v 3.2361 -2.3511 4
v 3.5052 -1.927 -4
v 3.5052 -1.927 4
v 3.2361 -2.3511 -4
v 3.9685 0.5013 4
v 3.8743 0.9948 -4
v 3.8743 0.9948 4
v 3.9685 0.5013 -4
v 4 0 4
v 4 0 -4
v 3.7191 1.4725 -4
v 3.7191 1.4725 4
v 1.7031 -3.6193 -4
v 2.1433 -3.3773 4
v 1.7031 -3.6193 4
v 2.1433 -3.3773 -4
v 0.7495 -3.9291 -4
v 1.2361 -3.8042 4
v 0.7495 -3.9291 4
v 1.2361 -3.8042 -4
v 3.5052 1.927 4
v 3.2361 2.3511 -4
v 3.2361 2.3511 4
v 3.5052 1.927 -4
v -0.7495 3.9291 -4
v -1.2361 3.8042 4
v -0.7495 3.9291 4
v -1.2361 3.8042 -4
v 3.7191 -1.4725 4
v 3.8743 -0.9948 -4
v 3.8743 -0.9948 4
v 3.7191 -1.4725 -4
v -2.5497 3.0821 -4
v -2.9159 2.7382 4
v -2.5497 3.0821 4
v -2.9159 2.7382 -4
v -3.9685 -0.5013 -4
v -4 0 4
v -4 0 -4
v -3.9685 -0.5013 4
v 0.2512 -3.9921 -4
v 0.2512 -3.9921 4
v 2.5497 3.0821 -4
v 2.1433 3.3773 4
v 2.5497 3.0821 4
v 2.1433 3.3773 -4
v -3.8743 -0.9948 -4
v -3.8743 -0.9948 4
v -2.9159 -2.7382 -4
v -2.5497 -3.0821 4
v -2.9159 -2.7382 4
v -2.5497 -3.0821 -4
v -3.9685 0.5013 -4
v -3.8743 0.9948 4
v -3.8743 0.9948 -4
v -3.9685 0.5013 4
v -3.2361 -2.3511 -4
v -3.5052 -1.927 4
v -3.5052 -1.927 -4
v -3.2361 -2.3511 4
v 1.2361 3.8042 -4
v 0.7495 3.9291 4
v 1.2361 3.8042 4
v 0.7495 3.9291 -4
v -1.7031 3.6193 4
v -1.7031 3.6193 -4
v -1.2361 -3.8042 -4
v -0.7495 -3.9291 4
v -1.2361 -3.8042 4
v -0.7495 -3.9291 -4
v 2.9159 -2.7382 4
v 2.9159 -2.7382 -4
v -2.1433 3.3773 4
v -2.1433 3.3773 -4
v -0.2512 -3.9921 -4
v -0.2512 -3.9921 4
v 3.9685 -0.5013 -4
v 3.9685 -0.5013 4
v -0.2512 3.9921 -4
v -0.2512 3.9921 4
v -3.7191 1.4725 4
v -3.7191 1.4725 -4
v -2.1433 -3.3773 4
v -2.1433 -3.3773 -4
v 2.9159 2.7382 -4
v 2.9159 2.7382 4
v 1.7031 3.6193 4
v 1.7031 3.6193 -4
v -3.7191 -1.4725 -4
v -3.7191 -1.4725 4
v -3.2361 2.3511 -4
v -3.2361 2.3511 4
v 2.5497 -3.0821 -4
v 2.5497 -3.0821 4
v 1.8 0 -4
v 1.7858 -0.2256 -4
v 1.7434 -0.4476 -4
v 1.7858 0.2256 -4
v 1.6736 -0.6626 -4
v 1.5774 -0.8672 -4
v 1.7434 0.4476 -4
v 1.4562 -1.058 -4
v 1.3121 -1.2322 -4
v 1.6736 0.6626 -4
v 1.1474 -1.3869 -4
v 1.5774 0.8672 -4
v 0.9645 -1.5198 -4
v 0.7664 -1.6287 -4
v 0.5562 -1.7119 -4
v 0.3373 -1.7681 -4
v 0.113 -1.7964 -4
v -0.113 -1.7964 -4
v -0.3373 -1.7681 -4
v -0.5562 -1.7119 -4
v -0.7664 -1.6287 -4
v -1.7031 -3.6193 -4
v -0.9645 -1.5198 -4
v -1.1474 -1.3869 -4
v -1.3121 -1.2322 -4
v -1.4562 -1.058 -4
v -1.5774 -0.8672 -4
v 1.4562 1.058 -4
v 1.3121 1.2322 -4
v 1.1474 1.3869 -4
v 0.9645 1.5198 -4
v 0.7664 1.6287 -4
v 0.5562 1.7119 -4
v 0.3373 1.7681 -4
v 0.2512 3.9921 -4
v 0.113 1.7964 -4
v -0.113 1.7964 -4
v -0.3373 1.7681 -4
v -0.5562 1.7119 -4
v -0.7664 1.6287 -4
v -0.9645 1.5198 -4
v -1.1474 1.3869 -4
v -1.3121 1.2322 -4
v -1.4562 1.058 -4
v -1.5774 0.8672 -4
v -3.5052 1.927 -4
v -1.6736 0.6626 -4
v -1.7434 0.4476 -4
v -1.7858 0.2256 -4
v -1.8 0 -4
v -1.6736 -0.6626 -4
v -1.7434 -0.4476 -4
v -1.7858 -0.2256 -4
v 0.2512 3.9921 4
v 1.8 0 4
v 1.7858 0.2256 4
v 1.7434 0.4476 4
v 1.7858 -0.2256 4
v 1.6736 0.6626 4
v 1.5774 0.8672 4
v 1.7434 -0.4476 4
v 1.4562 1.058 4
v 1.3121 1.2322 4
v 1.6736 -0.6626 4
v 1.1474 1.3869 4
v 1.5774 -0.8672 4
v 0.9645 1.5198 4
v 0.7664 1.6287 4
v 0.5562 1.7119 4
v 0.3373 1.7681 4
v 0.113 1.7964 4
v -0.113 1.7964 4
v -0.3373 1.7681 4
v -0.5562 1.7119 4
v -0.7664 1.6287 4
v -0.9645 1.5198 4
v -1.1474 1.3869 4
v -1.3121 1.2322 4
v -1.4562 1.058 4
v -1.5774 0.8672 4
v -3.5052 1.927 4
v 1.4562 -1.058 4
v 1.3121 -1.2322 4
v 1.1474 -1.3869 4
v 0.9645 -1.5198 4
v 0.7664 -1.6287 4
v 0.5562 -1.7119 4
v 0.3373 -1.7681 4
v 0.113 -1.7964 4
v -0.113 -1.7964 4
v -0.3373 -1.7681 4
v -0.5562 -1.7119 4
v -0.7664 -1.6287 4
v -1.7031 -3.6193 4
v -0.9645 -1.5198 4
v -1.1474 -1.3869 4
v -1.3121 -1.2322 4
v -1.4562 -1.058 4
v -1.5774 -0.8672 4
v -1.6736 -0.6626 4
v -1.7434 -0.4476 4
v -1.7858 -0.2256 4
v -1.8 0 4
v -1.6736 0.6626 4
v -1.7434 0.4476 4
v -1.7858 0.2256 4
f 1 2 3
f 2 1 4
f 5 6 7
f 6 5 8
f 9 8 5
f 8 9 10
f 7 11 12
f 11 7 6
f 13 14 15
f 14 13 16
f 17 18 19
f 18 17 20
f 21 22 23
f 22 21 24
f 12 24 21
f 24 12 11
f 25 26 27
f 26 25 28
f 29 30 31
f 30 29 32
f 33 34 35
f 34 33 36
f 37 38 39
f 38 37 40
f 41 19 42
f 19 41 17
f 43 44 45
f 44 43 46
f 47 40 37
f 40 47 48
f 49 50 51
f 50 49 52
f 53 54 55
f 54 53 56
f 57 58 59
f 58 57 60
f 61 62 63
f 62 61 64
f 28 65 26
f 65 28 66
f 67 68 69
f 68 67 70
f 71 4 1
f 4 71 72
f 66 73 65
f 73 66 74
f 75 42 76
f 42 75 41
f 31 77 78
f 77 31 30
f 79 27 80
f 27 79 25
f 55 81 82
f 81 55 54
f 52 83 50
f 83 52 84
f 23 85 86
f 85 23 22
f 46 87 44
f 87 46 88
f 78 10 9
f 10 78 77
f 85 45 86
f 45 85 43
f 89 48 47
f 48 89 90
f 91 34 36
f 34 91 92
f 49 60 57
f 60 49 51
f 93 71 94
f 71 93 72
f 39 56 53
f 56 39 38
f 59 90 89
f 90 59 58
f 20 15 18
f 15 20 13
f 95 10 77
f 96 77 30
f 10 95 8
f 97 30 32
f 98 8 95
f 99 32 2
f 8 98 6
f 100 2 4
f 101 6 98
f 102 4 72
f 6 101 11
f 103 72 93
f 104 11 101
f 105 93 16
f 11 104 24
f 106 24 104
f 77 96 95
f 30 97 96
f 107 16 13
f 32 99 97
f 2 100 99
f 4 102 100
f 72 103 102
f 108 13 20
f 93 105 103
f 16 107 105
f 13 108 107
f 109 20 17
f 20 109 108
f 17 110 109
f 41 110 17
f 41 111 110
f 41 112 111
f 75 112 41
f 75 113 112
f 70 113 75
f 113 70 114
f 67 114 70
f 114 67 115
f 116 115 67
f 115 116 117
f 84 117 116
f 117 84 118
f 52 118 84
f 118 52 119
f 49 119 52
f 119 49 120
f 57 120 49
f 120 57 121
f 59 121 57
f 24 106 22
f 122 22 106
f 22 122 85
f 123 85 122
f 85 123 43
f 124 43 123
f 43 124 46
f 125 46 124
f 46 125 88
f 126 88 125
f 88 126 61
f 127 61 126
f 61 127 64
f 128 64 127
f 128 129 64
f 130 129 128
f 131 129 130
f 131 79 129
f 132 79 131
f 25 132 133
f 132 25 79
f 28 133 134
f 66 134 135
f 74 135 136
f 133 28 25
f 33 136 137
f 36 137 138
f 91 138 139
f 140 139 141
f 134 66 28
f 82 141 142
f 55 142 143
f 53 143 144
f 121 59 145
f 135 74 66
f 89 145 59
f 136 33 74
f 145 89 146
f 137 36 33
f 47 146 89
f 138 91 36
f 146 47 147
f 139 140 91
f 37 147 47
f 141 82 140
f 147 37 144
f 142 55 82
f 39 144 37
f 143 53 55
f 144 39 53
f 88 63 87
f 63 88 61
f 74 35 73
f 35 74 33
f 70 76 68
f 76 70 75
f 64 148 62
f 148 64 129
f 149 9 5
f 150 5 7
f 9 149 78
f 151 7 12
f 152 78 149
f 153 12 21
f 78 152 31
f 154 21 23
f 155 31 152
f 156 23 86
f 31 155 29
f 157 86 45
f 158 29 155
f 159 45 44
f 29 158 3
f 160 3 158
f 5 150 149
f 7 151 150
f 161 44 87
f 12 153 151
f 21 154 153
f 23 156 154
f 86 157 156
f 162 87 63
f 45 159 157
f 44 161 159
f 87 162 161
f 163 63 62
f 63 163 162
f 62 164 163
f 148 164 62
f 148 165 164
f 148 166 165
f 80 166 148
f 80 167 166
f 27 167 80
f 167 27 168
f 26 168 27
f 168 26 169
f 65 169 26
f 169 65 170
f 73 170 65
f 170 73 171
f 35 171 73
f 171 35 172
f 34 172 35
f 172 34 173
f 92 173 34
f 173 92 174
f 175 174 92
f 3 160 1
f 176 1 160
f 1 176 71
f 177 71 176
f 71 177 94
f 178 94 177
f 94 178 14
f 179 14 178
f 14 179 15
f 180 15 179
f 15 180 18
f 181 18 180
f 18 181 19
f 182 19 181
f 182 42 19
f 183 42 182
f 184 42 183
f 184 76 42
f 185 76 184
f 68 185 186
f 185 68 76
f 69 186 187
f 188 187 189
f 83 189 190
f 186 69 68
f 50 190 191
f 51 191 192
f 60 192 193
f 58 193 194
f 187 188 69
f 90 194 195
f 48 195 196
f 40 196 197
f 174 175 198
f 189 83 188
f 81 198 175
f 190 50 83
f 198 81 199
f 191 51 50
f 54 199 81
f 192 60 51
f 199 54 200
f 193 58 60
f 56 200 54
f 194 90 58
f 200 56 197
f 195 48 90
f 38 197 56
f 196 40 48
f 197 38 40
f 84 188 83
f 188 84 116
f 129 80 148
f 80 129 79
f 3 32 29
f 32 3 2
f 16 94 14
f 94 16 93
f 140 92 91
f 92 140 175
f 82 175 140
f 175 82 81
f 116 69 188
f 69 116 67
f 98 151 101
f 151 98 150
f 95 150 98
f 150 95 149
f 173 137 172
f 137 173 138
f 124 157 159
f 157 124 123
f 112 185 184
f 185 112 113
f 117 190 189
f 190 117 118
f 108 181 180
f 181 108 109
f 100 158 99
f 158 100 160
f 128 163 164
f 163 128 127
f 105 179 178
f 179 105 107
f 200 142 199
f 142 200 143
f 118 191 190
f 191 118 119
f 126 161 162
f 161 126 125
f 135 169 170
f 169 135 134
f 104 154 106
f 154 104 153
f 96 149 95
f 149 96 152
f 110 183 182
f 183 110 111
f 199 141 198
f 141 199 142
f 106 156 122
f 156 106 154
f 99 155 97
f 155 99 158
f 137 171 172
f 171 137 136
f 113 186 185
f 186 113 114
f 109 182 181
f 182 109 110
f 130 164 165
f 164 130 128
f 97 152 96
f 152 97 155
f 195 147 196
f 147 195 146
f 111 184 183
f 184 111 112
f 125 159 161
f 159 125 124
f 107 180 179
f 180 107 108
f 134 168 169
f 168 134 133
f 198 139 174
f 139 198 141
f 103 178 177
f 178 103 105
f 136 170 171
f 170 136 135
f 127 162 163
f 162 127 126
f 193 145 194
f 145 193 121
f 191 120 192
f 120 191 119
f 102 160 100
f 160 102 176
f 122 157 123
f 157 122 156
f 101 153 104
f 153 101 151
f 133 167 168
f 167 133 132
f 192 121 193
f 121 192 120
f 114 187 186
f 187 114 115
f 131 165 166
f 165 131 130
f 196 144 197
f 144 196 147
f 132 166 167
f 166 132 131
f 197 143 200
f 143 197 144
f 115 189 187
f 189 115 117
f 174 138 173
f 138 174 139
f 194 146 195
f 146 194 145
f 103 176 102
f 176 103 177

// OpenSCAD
$fn = 50;


difference() {
	union() {
		translate(v = [0, 0, -4.0000000000]) {
			cylinder(h = 8, r = 4.0000000000);
		}
	}
	union() {
		#translate(v = [0, 0, -100.0000000000]) {
			cylinder(h = 200, r = 1.8000000000);
		}
	}
}
